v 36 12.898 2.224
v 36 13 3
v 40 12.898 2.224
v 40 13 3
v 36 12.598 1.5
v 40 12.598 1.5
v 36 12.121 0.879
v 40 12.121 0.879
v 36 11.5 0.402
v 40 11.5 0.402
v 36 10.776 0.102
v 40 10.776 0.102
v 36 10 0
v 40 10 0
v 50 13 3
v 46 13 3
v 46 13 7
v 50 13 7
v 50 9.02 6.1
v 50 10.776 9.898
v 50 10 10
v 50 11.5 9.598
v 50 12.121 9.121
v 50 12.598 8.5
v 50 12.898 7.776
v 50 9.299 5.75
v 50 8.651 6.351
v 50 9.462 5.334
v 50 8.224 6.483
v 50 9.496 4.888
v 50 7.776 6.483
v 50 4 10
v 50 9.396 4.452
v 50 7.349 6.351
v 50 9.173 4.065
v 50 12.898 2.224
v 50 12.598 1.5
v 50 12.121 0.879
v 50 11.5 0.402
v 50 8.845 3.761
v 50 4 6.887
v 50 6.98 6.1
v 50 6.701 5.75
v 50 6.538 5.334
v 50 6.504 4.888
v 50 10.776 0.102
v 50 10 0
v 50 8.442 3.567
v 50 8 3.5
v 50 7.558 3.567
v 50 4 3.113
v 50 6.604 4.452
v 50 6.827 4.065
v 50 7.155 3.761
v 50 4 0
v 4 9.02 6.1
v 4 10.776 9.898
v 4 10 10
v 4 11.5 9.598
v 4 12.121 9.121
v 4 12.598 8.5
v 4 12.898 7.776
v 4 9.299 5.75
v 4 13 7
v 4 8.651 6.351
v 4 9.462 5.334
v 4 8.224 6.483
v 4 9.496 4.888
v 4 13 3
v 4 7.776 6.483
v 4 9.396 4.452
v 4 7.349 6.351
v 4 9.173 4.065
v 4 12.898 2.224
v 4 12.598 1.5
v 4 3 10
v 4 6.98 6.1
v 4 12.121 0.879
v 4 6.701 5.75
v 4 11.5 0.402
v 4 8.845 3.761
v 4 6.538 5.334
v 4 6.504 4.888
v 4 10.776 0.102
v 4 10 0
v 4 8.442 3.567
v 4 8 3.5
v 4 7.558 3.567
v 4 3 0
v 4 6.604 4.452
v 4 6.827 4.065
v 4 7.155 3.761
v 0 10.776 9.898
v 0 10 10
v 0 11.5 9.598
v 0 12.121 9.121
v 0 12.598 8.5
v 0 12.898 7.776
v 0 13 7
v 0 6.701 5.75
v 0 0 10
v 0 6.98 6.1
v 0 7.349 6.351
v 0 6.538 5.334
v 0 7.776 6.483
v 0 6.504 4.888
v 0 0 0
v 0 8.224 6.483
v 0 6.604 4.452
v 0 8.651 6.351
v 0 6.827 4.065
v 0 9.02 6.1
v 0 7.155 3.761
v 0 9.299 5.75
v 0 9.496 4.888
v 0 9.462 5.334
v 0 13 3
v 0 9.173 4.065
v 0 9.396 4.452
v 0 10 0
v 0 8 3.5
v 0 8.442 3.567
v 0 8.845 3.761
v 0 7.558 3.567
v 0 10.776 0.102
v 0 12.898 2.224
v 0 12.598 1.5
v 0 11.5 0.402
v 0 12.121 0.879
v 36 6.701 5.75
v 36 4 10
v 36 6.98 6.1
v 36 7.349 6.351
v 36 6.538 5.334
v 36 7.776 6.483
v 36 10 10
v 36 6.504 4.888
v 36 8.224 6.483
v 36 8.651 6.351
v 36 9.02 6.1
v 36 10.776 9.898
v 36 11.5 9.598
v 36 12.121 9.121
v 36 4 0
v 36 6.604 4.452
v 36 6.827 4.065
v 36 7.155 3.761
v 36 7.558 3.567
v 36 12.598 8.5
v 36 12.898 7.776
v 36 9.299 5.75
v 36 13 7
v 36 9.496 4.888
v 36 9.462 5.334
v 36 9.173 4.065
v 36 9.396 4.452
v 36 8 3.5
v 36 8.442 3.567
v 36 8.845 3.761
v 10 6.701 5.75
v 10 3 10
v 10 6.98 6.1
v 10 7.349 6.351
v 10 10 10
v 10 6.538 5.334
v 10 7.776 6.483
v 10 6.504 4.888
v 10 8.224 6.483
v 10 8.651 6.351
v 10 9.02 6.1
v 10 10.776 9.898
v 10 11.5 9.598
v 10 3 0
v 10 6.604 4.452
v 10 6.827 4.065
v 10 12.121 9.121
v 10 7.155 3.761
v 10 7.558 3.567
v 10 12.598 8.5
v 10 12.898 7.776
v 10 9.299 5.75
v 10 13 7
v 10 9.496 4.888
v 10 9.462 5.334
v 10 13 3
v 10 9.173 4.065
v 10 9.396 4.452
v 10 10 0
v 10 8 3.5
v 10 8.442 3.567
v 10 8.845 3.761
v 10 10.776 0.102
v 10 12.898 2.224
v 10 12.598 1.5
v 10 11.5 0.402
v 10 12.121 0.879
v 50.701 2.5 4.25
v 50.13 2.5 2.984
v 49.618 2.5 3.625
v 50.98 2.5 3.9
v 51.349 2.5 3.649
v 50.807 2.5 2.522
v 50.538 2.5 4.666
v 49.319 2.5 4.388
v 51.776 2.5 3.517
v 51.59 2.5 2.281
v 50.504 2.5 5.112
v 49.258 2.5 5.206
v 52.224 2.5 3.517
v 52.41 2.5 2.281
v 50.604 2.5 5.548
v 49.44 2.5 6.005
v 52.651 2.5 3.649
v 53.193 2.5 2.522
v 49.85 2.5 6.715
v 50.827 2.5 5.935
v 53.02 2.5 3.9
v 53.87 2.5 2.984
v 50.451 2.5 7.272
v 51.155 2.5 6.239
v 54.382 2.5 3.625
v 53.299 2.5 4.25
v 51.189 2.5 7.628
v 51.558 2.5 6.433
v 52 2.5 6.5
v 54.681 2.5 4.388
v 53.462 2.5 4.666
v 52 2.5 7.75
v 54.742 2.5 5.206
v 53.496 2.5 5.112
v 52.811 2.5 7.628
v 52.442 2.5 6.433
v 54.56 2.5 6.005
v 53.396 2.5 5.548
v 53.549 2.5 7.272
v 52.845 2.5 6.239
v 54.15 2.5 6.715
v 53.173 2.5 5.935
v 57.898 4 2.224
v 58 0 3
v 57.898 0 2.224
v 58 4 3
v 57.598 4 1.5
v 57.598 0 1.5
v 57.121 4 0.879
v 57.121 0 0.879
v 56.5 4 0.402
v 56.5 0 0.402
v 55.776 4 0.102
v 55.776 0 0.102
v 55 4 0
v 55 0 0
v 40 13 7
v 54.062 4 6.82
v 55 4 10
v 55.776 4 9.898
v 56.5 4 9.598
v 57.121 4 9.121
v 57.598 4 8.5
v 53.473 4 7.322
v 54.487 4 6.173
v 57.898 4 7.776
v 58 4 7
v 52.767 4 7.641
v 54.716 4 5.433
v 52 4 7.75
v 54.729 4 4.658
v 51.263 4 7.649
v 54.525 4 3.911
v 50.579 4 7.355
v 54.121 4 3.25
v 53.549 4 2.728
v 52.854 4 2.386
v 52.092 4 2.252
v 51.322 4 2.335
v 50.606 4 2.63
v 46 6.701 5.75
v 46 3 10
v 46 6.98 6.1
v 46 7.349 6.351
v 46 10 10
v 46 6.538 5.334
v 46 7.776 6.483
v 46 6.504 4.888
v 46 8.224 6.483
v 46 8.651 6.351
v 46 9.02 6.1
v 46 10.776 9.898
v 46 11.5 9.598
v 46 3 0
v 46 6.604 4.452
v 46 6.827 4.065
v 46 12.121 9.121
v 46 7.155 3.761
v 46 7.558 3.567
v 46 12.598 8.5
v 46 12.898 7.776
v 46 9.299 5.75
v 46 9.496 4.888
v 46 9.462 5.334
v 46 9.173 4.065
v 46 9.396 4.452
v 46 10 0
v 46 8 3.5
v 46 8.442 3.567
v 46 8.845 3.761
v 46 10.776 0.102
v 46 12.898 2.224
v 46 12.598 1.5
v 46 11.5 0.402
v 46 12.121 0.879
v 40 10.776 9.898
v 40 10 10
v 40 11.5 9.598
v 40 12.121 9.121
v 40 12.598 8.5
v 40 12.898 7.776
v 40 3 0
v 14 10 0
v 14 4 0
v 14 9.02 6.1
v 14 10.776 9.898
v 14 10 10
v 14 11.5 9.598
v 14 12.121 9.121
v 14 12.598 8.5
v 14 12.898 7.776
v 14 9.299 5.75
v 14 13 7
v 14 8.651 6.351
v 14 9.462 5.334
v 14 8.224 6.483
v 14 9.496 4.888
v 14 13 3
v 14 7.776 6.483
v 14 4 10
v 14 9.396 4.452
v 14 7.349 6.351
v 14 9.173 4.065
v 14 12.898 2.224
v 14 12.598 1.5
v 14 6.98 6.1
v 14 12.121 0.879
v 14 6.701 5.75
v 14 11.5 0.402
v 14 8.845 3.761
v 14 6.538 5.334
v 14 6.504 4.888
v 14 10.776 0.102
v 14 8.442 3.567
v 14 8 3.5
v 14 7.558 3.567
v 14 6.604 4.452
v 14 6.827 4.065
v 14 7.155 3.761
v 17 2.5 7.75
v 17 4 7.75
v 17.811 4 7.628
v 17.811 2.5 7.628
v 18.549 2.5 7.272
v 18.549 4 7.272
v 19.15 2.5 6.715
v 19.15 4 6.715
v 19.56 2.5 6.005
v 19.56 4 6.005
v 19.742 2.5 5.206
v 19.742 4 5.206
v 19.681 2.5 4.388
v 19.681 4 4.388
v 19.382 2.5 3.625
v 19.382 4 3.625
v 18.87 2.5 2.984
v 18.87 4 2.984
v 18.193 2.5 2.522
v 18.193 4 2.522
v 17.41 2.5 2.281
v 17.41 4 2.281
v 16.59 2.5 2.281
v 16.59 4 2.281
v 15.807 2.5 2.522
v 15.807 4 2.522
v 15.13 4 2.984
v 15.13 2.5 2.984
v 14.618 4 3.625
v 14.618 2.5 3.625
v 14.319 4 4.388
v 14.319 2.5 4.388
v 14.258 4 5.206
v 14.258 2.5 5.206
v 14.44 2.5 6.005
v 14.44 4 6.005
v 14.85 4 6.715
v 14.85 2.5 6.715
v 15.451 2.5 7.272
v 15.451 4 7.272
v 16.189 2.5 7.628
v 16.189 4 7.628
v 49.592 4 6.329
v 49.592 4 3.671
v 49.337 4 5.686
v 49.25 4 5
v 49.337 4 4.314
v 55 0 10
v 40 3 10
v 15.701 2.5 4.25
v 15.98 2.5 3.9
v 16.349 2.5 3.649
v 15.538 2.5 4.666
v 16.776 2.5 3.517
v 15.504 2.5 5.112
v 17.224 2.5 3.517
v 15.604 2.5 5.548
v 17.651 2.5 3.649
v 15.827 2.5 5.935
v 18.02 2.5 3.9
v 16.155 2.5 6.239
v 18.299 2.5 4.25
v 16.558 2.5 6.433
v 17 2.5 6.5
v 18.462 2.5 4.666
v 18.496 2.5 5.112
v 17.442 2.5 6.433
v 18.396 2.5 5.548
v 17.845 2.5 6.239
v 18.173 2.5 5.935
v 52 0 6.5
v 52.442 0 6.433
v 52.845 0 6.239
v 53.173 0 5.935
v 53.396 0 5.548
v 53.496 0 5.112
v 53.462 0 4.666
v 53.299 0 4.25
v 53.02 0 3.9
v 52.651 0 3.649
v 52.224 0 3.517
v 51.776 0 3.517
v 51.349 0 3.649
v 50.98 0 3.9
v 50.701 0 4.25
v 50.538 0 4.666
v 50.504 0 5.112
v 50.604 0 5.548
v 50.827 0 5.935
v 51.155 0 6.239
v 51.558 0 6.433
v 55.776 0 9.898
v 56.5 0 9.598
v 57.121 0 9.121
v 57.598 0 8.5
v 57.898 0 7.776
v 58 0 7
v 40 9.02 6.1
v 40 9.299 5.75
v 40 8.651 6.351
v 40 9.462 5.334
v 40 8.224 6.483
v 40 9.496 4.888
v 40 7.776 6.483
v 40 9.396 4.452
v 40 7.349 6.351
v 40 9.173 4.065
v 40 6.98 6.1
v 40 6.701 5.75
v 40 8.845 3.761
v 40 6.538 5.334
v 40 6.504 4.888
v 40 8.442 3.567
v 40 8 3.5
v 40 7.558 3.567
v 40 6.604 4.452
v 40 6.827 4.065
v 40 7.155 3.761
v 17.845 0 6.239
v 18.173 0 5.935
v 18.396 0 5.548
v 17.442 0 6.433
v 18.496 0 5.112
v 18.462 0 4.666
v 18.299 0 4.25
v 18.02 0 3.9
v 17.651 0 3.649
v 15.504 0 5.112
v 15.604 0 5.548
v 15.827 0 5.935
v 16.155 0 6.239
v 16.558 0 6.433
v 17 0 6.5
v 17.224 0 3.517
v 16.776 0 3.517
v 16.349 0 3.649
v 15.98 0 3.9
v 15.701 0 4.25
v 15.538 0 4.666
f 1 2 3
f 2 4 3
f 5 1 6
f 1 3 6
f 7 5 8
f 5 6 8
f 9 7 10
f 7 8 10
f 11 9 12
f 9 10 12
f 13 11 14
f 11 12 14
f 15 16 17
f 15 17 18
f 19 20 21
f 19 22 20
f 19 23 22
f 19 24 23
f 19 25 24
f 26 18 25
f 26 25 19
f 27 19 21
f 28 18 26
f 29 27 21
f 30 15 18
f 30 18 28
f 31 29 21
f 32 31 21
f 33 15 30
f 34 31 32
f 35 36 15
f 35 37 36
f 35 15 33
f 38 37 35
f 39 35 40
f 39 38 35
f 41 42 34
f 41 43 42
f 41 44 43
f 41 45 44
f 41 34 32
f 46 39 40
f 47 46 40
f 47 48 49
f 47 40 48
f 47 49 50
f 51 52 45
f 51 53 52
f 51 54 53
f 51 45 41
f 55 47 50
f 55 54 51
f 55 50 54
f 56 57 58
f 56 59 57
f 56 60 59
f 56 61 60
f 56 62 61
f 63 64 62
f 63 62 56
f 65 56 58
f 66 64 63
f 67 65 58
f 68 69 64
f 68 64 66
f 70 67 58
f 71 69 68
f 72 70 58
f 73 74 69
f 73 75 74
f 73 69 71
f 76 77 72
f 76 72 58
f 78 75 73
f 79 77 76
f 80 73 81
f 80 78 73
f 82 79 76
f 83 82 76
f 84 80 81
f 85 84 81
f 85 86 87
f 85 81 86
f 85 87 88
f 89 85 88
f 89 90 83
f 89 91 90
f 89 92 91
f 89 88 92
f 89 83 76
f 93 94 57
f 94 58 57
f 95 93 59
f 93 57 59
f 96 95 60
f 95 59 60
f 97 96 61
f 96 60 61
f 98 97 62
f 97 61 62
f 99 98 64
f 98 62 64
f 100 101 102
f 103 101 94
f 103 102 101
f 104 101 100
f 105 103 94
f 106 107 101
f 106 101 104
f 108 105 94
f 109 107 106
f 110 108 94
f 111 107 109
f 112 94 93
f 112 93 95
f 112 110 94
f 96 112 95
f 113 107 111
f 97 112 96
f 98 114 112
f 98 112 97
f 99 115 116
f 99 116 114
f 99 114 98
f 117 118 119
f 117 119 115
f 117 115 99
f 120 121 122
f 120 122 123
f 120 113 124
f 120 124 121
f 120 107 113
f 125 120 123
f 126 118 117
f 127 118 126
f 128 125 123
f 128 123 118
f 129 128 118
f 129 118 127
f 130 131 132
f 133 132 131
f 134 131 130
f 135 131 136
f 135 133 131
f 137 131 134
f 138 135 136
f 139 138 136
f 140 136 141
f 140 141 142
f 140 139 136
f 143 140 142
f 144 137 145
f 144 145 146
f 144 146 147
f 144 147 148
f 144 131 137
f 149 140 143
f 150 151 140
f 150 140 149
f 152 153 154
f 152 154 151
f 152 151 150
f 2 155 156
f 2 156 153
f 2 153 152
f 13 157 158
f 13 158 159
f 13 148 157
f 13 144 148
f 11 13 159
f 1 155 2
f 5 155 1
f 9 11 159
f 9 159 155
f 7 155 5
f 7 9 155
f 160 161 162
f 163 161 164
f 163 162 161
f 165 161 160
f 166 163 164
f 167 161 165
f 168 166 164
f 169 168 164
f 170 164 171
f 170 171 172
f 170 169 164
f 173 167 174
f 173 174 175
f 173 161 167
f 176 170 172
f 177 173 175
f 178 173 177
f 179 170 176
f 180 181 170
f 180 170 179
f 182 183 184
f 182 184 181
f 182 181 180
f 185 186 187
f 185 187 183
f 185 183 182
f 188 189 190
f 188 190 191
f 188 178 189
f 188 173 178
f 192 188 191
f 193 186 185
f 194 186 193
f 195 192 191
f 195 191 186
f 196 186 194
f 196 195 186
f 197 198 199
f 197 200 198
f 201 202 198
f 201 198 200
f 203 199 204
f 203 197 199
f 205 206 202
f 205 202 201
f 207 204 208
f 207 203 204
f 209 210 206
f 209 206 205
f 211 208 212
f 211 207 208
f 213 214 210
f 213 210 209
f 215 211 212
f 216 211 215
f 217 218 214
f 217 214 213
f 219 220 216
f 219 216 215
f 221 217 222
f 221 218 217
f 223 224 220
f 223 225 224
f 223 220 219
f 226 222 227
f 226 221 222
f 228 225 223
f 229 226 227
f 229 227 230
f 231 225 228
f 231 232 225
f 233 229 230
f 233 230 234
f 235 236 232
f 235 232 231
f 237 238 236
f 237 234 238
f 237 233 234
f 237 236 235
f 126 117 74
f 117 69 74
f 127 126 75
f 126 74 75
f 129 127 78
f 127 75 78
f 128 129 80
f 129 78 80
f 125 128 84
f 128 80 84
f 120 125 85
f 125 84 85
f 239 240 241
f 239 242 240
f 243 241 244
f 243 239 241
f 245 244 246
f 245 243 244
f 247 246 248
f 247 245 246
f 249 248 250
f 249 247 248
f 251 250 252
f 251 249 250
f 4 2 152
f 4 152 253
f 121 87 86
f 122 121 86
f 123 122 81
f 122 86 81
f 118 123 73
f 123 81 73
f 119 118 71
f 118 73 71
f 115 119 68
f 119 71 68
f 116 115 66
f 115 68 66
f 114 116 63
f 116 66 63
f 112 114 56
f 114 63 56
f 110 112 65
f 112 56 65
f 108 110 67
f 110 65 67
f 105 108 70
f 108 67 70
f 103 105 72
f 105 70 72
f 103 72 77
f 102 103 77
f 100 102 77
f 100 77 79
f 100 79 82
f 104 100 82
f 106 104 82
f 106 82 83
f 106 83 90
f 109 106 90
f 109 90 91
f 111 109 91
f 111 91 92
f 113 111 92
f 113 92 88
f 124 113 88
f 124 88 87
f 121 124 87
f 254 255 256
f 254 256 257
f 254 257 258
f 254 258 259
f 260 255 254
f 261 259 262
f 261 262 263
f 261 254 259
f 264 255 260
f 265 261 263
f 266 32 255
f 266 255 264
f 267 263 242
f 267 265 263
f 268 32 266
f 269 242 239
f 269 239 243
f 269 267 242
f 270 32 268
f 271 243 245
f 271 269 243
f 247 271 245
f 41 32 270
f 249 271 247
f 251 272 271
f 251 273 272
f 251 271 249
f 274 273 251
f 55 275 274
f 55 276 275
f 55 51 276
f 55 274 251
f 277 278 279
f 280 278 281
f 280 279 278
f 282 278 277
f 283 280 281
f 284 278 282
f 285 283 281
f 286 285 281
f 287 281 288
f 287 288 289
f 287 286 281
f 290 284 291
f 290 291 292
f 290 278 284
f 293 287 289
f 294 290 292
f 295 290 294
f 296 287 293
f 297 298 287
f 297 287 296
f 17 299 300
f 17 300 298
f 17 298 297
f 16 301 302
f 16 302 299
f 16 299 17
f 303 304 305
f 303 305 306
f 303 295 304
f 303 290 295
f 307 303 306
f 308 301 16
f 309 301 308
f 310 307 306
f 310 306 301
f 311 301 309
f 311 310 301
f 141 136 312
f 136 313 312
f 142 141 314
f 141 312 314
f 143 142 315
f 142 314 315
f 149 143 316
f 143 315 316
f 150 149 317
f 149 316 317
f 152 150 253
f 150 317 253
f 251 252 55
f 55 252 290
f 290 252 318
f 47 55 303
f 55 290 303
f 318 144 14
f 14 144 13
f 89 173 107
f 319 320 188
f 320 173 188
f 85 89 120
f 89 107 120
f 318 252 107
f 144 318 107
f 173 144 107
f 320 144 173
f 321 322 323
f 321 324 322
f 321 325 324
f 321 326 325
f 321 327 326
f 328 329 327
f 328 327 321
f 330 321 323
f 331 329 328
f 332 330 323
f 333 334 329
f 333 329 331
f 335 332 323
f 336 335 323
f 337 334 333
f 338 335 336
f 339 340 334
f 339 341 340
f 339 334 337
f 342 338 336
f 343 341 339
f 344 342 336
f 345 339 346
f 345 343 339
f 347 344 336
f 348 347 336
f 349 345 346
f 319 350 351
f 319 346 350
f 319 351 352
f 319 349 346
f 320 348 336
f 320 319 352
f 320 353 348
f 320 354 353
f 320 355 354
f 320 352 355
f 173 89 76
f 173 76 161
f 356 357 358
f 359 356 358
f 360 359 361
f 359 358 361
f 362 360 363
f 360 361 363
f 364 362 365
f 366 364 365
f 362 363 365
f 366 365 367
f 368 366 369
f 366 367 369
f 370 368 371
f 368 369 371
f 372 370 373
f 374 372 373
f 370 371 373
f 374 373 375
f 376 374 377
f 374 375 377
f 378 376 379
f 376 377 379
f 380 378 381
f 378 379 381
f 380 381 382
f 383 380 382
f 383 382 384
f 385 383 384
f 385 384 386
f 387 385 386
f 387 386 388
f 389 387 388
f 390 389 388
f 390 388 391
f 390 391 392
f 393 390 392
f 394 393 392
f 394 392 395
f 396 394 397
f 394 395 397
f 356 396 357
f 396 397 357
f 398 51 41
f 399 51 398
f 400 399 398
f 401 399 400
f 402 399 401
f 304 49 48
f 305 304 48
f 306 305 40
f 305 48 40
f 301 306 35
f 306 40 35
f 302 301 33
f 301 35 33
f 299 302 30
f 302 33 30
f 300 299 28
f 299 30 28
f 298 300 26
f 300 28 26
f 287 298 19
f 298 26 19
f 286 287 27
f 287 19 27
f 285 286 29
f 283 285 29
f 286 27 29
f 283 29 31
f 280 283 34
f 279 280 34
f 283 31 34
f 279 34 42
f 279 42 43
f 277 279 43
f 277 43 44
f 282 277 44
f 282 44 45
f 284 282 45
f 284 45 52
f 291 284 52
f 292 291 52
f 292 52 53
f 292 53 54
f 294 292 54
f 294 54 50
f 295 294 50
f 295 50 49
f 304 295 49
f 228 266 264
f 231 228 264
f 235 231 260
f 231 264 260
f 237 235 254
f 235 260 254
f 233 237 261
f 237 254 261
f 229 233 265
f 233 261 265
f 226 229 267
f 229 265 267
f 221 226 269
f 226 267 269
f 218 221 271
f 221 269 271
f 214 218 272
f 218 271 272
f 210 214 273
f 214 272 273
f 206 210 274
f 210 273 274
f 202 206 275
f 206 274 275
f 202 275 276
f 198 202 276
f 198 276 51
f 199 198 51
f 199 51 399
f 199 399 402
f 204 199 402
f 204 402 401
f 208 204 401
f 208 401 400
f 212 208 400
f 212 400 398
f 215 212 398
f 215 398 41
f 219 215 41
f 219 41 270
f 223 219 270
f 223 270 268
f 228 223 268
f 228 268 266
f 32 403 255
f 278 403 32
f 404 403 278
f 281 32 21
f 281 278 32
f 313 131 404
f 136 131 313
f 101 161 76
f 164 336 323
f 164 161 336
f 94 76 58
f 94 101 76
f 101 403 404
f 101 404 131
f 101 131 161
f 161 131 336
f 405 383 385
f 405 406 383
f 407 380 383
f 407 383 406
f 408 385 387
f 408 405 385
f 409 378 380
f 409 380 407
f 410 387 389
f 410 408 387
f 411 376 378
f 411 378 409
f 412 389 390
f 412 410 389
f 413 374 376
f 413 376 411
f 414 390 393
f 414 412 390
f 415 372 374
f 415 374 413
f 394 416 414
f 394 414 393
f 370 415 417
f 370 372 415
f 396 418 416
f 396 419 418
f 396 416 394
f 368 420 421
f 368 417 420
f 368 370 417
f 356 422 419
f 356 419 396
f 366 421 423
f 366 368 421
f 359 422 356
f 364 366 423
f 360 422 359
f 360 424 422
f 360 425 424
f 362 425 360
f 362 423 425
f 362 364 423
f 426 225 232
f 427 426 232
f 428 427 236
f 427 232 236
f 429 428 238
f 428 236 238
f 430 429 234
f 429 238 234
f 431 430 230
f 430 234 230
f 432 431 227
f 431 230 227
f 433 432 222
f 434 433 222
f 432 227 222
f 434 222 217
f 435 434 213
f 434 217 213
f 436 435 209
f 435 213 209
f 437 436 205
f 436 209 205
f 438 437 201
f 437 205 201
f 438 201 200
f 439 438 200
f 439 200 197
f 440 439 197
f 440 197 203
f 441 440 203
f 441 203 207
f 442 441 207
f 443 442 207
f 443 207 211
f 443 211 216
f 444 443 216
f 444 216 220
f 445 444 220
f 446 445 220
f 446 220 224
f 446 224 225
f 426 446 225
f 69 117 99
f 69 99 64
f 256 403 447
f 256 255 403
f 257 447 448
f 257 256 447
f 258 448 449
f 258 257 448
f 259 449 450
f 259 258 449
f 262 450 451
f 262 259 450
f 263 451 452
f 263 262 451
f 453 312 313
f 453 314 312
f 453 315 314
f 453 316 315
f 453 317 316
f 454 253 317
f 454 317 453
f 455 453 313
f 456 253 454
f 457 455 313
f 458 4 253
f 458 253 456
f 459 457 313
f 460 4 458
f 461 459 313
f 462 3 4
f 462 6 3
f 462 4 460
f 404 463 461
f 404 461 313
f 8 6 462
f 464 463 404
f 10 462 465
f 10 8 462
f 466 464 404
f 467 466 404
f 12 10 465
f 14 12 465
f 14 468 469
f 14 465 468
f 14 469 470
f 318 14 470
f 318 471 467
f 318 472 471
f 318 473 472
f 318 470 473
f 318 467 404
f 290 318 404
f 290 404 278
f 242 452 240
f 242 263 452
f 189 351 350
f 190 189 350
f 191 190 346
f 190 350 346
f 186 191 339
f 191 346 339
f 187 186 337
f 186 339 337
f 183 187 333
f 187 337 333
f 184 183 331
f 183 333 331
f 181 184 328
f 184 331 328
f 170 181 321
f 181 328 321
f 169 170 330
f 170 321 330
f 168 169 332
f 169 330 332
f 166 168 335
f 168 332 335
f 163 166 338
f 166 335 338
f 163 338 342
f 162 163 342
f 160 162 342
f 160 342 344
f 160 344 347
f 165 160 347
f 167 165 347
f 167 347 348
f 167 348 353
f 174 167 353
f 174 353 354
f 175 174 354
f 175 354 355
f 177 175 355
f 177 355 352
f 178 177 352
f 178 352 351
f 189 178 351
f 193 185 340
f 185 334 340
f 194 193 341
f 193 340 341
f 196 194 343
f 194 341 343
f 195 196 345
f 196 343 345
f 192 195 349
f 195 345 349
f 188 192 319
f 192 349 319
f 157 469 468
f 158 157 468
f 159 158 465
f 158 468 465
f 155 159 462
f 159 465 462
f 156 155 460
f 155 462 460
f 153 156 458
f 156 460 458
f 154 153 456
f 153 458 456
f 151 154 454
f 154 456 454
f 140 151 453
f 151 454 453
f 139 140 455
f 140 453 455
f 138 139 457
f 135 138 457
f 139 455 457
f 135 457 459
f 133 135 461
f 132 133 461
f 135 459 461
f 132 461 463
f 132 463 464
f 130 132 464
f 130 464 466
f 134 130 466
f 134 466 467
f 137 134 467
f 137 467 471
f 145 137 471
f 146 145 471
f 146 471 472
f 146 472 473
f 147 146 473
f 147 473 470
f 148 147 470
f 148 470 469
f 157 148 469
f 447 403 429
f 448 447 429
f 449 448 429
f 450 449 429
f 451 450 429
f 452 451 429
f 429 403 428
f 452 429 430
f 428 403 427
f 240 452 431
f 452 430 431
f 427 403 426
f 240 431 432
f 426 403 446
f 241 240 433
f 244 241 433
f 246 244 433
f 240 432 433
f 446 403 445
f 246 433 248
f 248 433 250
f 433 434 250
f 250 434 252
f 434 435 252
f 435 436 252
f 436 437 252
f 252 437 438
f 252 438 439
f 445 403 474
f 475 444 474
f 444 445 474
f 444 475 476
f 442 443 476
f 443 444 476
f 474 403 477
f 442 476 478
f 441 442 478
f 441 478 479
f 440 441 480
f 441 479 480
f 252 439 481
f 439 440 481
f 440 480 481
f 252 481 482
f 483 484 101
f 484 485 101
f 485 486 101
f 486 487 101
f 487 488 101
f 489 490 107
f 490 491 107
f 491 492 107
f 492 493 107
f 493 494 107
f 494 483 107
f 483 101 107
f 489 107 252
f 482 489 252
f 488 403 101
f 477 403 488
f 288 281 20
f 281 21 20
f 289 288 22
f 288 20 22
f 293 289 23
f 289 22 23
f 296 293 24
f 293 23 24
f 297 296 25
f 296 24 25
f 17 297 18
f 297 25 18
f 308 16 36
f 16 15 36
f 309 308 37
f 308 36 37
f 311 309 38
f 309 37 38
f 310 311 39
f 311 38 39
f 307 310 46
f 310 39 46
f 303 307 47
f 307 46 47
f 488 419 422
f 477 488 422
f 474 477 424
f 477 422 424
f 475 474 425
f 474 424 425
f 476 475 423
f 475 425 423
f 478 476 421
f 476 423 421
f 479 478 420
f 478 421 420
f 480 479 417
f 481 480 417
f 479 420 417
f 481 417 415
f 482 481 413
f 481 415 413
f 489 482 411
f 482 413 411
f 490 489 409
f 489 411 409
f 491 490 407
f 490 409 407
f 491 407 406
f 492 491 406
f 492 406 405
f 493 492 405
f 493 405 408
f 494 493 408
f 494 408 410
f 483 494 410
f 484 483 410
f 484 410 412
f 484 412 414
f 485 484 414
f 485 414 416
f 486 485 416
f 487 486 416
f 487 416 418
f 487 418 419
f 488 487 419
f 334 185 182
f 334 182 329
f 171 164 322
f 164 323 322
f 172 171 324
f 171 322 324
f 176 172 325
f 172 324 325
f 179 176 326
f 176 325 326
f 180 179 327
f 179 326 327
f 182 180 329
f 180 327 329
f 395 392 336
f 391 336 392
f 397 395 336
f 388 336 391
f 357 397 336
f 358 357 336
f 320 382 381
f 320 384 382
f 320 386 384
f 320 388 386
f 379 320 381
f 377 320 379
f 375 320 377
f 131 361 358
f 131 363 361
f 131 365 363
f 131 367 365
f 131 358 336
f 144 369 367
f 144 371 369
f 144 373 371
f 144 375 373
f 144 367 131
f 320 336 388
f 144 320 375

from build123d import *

# Parameters (mm, degrees)
EXTRUDE_1_DEPTH     = 10
SKETCH_2_W          = 10
SKETCH_2_H          = 4
EXTRUDE_2_DEPTH     = 8
SKETCH_3_R          = 1.5
CUT_EXTRUDE_1_DEPTH = 5
SKETCH_4_R          = 2.75
CUT_EXTRUDE_2_DEPTH = 1.5
FILLET_1_R          = 3
SKETCH_5_R          = 1.5
CUT_EXTRUDE_3_DEPTH = 53.621288468
FILLET_2_R          = 3


with BuildPart() as part:
    # 草图1 → 凸台-拉伸1 (new body)
    with BuildSketch(Plane.XY):
        Polygon((0, 0), (0, 13), (4, 13), (4, 3), (10, 3), (10, 13), (14, 13), (14, 4), (36, 4), (36, 13), (40, 13), (40, 3), (46, 3), (46, 13), (50, 13), (50, 0), align=None)
    extrude(amount=EXTRUDE_1_DEPTH)

    # 草图2 → 凸台-拉伸2 (add)
    with BuildSketch(Plane(origin=(50, 0, 0), x_dir=(0, 0, -1), z_dir=(1, 0, 0))):
        with Locations((-5, 2)):
            Rectangle(SKETCH_2_W, SKETCH_2_H)
    extrude(amount=EXTRUDE_2_DEPTH)

    # 草图3 → 切除-拉伸1 (cut)
    with BuildSketch(Plane(origin=(0, 4, 0), x_dir=(1, 0, 0), z_dir=(0, 1, 0))):
        with Locations(Location((17, -5, 0), (0, 0, 270))):
            Circle(SKETCH_3_R)
        with Locations(Location((52, -5, 0), (0, 0, 270))):
            Circle(SKETCH_3_R)
    extrude(amount=-CUT_EXTRUDE_1_DEPTH, mode=Mode.SUBTRACT)

    # 草图4 → 切除-拉伸2 (cut)
    with BuildSketch(Plane(origin=(0, 4, 0), x_dir=(1, 0, 0), z_dir=(0, 1, 0))):
        with Locations(Location((17, -5, 0), (0, 0, 270))):
            Circle(SKETCH_4_R)
        with Locations(Location((52, -5, 0), (0, 0, 270))):
            Circle(SKETCH_4_R)
    extrude(amount=-CUT_EXTRUDE_2_DEPTH, mode=Mode.SUBTRACT)

    # 圆角1
    fillet_1_edges = [part.edges().sort_by_distance(p)[0] for p in [
        (48, 13, 10),
        (2, 13, 0),
        (12, 13, 0),
        (38, 13, 0),
        (48, 13, 0),
        (38, 13, 10),
        (12, 13, 10),
        (2, 13, 10),
    ]]
    fillet(fillet_1_edges, radius=FILLET_1_R)

    # 草图5 → 切除-拉伸3 (cut, through all)
    with BuildSketch(Plane(origin=(50, 0, 0), x_dir=(0, 0, -1), z_dir=(1, 0, 0))):
        with Locations((-5, 8)):
            Circle(SKETCH_5_R)
    extrude(amount=-CUT_EXTRUDE_3_DEPTH, mode=Mode.SUBTRACT)

    # 圆角2
    fillet_2_edges = [part.edges().sort_by_distance(p)[0] for p in [
        (58, 2, 10),
        (58, 2, 0),
    ]]
    fillet(fillet_2_edges, radius=FILLET_2_R)


solid = part.part
